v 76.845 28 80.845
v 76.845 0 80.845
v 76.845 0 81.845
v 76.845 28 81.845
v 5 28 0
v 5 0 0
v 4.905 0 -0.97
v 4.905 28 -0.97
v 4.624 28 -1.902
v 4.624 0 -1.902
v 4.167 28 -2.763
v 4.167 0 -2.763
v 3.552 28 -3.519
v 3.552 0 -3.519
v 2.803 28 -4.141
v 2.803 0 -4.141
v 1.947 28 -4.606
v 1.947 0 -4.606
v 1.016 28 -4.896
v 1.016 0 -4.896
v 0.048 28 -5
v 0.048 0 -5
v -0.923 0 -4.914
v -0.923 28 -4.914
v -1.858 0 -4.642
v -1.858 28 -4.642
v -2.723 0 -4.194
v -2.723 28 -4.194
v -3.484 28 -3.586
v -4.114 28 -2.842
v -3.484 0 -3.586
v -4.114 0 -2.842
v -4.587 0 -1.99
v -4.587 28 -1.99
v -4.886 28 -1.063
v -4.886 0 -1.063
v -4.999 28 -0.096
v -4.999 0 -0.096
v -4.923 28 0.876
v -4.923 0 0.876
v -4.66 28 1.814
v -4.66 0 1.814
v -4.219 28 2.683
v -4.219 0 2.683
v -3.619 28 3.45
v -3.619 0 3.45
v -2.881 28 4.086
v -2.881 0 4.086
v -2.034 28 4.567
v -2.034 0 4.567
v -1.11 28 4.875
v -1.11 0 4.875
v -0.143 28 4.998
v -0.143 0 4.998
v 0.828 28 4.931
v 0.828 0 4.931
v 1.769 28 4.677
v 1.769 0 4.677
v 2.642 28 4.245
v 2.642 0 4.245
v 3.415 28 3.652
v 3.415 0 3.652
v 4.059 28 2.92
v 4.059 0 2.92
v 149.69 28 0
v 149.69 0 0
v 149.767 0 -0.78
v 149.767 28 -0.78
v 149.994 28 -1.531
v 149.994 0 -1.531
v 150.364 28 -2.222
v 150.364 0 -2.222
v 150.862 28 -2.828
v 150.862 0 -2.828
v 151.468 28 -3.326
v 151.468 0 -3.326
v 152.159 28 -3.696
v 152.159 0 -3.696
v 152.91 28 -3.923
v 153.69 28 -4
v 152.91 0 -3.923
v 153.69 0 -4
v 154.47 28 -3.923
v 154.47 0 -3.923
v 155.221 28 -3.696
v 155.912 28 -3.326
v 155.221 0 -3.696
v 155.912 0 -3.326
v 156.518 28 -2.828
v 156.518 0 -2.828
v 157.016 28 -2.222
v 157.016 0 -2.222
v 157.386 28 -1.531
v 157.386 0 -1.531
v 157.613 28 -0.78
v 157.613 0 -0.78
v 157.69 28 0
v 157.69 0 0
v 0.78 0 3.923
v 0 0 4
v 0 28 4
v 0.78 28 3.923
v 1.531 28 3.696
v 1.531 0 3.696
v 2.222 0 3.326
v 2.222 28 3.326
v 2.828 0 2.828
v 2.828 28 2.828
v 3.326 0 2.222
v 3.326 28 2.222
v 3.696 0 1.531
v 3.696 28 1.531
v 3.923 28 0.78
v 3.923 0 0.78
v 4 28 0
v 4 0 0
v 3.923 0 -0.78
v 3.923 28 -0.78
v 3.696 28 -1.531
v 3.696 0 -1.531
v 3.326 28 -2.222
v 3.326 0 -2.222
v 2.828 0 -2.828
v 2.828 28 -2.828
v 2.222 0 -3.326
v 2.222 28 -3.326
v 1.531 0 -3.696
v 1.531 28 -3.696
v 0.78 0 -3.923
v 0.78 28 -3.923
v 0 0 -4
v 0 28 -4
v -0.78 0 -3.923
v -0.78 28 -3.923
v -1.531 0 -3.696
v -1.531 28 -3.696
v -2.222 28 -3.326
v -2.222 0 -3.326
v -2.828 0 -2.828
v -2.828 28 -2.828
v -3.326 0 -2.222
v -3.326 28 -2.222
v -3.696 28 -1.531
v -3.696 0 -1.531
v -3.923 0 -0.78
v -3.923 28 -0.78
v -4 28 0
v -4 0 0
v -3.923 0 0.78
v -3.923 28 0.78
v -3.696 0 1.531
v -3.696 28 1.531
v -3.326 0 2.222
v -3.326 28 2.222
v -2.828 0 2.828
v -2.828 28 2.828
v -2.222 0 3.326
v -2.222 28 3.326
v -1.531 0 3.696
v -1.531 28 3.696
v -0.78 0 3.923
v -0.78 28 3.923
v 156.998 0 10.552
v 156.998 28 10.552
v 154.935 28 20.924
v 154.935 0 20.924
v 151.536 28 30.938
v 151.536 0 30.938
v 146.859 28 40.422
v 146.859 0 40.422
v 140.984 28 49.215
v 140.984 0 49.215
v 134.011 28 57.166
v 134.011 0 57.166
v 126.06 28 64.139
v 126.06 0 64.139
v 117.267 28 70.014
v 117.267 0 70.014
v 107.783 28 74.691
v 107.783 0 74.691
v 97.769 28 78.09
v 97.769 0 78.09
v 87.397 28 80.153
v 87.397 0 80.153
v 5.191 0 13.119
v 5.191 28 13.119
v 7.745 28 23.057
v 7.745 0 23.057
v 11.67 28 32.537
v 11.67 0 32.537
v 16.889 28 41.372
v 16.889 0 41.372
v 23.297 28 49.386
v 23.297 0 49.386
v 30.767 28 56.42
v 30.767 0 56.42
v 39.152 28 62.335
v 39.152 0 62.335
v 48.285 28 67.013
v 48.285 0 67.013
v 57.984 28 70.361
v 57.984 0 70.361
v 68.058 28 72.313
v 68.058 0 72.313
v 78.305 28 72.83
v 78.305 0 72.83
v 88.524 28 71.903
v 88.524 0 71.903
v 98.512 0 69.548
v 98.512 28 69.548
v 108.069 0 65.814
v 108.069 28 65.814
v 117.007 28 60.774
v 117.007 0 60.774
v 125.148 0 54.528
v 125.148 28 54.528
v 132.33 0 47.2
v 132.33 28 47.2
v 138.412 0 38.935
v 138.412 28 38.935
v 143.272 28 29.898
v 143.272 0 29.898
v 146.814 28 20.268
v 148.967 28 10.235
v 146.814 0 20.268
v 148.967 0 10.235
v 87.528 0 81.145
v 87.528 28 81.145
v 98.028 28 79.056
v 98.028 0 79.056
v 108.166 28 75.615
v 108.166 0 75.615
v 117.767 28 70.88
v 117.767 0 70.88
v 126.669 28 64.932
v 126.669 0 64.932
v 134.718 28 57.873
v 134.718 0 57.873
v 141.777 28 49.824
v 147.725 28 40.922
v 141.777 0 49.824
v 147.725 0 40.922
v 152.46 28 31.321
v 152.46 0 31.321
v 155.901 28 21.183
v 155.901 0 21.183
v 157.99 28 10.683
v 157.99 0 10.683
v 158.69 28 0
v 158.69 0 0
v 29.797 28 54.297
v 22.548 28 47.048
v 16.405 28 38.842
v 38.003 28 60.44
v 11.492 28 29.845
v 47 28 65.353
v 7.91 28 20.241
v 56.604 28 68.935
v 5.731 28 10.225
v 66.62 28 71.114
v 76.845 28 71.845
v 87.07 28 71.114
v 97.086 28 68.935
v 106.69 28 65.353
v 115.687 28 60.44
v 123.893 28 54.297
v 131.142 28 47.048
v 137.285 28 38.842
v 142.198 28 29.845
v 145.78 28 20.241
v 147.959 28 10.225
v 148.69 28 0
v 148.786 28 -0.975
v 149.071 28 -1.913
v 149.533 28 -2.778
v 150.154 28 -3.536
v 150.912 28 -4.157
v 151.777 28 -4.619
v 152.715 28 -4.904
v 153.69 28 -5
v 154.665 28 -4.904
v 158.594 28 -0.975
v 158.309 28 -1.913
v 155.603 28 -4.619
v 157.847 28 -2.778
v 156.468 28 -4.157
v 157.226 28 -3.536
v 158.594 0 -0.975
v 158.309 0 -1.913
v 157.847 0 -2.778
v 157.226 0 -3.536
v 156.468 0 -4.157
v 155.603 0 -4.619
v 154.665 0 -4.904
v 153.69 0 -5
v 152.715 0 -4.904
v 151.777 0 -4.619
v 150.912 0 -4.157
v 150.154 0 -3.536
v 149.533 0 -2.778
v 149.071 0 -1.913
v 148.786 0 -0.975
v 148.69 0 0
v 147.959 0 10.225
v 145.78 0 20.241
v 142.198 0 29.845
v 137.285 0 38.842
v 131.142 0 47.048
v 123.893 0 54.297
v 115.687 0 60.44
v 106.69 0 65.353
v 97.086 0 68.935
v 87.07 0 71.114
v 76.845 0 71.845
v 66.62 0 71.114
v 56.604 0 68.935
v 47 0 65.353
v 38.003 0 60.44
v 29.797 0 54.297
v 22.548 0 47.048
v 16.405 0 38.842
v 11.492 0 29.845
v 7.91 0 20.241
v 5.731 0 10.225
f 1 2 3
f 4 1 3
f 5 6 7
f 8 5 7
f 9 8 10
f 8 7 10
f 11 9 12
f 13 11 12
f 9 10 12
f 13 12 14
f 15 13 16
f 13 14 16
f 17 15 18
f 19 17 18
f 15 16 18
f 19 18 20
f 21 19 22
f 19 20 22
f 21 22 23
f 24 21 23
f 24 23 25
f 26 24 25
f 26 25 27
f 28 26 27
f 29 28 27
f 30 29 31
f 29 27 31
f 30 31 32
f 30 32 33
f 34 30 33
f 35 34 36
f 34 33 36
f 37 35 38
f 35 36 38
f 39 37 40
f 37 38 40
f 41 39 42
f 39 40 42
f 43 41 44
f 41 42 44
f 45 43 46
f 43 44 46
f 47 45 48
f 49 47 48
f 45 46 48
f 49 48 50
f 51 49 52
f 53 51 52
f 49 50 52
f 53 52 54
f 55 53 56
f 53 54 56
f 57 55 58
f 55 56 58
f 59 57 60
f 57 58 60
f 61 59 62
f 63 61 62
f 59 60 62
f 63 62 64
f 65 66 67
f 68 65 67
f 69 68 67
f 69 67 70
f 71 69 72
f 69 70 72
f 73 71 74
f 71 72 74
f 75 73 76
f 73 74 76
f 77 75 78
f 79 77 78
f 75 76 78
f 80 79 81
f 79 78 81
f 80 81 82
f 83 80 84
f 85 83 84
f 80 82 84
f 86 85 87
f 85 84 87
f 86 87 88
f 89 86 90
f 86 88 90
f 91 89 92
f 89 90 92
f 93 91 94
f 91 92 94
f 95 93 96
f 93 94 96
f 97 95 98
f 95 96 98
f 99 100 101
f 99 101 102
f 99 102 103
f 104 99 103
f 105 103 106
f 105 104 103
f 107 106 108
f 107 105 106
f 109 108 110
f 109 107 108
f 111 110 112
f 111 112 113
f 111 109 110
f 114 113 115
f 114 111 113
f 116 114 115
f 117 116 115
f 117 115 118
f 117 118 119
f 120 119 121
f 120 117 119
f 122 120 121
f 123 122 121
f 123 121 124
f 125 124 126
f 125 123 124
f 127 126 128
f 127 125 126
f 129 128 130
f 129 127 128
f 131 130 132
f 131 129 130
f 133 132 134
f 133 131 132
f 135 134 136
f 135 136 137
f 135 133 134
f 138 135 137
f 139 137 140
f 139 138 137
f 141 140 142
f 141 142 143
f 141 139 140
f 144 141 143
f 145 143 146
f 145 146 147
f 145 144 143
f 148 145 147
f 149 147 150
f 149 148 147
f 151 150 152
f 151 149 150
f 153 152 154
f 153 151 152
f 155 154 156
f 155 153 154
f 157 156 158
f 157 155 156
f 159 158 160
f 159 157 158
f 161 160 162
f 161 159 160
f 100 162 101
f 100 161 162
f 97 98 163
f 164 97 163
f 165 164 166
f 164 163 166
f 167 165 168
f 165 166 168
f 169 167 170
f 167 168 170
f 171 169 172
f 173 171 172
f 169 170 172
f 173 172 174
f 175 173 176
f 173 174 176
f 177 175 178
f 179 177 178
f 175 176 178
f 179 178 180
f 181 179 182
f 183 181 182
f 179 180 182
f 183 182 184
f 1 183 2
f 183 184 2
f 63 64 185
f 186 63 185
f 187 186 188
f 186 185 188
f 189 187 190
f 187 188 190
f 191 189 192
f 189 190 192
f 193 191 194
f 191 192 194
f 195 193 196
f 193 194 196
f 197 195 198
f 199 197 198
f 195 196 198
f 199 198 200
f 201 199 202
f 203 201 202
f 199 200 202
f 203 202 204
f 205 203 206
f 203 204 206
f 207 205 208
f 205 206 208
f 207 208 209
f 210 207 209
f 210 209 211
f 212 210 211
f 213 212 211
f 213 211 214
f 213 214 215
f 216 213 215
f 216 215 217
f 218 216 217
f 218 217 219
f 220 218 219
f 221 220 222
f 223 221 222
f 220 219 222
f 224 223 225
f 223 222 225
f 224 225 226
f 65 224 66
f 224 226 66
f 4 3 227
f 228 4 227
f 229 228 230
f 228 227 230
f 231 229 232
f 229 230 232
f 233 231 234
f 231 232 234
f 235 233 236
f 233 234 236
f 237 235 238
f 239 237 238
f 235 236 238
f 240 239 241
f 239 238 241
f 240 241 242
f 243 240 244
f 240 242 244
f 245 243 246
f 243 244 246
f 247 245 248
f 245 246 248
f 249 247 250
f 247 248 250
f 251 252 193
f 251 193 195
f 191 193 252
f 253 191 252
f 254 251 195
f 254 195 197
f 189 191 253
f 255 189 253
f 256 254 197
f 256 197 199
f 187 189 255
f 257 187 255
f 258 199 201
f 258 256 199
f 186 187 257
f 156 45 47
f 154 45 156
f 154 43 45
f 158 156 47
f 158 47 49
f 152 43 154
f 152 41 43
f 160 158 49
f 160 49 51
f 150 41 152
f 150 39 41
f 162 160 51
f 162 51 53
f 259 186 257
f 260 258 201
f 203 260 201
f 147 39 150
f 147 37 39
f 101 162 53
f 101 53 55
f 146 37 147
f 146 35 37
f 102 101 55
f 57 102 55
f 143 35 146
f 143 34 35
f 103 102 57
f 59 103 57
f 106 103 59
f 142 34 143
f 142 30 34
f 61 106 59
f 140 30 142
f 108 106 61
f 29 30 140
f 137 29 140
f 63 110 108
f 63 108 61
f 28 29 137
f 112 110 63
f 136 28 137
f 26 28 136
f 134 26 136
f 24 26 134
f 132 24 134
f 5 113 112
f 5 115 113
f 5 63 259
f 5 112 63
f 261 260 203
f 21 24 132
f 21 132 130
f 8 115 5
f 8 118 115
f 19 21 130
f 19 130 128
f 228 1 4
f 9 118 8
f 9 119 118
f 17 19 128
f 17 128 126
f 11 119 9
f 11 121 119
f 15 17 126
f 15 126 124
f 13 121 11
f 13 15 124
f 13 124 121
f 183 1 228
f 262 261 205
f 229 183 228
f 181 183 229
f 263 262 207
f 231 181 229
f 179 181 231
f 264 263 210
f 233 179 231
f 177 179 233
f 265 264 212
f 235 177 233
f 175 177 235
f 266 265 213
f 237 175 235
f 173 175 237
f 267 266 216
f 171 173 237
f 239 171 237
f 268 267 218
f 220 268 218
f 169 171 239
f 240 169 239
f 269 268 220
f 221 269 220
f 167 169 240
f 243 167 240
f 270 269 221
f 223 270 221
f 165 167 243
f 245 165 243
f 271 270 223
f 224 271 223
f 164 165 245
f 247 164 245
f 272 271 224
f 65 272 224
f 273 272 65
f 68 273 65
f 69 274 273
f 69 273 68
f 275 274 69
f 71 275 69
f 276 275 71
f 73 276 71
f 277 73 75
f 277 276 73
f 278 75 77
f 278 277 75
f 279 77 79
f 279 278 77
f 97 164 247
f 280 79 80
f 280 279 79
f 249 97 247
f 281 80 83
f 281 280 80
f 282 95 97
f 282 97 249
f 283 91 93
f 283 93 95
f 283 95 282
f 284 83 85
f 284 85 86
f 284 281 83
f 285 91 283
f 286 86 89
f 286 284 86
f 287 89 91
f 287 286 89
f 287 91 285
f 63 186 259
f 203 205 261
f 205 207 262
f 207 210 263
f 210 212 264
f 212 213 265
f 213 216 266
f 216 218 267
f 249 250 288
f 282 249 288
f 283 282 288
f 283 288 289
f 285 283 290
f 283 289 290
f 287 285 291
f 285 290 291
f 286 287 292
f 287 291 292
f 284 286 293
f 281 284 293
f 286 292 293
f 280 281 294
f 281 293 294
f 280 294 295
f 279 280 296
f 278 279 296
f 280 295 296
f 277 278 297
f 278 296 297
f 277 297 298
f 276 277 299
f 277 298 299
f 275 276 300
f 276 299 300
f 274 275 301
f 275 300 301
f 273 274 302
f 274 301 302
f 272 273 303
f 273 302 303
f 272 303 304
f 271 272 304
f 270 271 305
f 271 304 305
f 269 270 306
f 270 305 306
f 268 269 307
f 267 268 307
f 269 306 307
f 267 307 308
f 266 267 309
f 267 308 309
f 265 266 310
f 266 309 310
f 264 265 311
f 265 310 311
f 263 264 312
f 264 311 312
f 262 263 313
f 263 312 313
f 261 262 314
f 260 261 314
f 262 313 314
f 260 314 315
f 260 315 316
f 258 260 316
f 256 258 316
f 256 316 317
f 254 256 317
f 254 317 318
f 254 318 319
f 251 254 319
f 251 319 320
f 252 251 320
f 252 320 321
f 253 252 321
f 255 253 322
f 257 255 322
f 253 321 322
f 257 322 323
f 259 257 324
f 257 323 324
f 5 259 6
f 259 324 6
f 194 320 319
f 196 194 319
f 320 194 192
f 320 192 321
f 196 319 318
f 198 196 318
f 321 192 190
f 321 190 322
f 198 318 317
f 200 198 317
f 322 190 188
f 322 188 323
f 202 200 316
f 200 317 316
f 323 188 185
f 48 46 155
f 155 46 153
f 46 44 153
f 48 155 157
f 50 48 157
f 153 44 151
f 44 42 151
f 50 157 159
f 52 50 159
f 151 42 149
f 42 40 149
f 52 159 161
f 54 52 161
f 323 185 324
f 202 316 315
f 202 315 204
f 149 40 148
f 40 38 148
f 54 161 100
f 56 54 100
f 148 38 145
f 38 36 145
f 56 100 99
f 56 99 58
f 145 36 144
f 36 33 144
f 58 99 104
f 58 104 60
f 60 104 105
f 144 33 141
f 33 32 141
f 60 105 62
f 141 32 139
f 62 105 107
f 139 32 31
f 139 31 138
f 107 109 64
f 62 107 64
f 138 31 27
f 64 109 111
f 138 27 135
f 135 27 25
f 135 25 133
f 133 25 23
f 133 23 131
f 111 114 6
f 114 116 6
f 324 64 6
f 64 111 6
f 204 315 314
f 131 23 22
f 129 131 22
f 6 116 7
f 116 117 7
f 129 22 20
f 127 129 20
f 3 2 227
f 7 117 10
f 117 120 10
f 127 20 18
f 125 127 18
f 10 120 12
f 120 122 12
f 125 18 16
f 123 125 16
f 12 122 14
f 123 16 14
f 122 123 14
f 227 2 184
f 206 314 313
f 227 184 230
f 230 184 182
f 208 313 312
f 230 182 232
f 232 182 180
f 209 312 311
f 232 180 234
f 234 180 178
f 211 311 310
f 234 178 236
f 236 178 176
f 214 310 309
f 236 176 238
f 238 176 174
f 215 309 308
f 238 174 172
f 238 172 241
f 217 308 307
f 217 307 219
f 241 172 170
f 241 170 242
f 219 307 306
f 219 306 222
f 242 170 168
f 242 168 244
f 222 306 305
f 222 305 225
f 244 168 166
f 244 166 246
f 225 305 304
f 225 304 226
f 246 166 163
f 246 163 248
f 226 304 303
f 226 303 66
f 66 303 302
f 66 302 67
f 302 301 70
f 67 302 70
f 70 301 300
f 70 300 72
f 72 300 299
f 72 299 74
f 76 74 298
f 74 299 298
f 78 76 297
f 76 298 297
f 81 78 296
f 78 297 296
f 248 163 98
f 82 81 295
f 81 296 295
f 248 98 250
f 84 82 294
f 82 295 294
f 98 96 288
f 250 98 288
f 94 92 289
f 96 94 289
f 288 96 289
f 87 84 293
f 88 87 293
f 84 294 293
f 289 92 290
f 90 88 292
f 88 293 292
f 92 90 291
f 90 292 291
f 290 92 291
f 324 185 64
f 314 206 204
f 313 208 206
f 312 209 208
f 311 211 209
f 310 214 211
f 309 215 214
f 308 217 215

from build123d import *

# Parameters (mm, degrees)
SKETCH1_R           = 4
BOSS_EXTRUDE1_DEPTH = 28


with BuildPart() as part:
    # Sketch1 → Boss-Extrude1 (new body)
    with BuildSketch(Plane(origin=(0, 0, 0), x_dir=(1, 0, 0), z_dir=(0, 1, 0))):
        with BuildLine():
            Line((76.845, -80.845), (76.845, -81.845))
            ThreePointArc((76.845, -81.845), (134.718154506, -57.873154506), (158.69, 0))
            ThreePointArc((158.69, 0), (153.69, 5), (148.69, 0))
            ThreePointArc((148.69, 0), (76.845, -71.845), (5, 0))
            ThreePointArc((5, 0), (-4.758823236, 1.534145171), (4.058559438, -2.920290275))
            ThreePointArc((4.058559438, -2.920290275), (78.305438675, -72.830358669), (149.69, 0))
            ThreePointArc((149.69, 0), (153.69, 4), (157.69, 0))
            ThreePointArc((157.69, 0), (134.011047725, -57.166047725), (76.845, -80.845))
        make_face()
        with Locations(Location((0, 0, 0), (0, 0, 270))):
            Circle(SKETCH1_R, mode=Mode.SUBTRACT)
    extrude(amount=BOSS_EXTRUDE1_DEPTH)


solid = part.part
